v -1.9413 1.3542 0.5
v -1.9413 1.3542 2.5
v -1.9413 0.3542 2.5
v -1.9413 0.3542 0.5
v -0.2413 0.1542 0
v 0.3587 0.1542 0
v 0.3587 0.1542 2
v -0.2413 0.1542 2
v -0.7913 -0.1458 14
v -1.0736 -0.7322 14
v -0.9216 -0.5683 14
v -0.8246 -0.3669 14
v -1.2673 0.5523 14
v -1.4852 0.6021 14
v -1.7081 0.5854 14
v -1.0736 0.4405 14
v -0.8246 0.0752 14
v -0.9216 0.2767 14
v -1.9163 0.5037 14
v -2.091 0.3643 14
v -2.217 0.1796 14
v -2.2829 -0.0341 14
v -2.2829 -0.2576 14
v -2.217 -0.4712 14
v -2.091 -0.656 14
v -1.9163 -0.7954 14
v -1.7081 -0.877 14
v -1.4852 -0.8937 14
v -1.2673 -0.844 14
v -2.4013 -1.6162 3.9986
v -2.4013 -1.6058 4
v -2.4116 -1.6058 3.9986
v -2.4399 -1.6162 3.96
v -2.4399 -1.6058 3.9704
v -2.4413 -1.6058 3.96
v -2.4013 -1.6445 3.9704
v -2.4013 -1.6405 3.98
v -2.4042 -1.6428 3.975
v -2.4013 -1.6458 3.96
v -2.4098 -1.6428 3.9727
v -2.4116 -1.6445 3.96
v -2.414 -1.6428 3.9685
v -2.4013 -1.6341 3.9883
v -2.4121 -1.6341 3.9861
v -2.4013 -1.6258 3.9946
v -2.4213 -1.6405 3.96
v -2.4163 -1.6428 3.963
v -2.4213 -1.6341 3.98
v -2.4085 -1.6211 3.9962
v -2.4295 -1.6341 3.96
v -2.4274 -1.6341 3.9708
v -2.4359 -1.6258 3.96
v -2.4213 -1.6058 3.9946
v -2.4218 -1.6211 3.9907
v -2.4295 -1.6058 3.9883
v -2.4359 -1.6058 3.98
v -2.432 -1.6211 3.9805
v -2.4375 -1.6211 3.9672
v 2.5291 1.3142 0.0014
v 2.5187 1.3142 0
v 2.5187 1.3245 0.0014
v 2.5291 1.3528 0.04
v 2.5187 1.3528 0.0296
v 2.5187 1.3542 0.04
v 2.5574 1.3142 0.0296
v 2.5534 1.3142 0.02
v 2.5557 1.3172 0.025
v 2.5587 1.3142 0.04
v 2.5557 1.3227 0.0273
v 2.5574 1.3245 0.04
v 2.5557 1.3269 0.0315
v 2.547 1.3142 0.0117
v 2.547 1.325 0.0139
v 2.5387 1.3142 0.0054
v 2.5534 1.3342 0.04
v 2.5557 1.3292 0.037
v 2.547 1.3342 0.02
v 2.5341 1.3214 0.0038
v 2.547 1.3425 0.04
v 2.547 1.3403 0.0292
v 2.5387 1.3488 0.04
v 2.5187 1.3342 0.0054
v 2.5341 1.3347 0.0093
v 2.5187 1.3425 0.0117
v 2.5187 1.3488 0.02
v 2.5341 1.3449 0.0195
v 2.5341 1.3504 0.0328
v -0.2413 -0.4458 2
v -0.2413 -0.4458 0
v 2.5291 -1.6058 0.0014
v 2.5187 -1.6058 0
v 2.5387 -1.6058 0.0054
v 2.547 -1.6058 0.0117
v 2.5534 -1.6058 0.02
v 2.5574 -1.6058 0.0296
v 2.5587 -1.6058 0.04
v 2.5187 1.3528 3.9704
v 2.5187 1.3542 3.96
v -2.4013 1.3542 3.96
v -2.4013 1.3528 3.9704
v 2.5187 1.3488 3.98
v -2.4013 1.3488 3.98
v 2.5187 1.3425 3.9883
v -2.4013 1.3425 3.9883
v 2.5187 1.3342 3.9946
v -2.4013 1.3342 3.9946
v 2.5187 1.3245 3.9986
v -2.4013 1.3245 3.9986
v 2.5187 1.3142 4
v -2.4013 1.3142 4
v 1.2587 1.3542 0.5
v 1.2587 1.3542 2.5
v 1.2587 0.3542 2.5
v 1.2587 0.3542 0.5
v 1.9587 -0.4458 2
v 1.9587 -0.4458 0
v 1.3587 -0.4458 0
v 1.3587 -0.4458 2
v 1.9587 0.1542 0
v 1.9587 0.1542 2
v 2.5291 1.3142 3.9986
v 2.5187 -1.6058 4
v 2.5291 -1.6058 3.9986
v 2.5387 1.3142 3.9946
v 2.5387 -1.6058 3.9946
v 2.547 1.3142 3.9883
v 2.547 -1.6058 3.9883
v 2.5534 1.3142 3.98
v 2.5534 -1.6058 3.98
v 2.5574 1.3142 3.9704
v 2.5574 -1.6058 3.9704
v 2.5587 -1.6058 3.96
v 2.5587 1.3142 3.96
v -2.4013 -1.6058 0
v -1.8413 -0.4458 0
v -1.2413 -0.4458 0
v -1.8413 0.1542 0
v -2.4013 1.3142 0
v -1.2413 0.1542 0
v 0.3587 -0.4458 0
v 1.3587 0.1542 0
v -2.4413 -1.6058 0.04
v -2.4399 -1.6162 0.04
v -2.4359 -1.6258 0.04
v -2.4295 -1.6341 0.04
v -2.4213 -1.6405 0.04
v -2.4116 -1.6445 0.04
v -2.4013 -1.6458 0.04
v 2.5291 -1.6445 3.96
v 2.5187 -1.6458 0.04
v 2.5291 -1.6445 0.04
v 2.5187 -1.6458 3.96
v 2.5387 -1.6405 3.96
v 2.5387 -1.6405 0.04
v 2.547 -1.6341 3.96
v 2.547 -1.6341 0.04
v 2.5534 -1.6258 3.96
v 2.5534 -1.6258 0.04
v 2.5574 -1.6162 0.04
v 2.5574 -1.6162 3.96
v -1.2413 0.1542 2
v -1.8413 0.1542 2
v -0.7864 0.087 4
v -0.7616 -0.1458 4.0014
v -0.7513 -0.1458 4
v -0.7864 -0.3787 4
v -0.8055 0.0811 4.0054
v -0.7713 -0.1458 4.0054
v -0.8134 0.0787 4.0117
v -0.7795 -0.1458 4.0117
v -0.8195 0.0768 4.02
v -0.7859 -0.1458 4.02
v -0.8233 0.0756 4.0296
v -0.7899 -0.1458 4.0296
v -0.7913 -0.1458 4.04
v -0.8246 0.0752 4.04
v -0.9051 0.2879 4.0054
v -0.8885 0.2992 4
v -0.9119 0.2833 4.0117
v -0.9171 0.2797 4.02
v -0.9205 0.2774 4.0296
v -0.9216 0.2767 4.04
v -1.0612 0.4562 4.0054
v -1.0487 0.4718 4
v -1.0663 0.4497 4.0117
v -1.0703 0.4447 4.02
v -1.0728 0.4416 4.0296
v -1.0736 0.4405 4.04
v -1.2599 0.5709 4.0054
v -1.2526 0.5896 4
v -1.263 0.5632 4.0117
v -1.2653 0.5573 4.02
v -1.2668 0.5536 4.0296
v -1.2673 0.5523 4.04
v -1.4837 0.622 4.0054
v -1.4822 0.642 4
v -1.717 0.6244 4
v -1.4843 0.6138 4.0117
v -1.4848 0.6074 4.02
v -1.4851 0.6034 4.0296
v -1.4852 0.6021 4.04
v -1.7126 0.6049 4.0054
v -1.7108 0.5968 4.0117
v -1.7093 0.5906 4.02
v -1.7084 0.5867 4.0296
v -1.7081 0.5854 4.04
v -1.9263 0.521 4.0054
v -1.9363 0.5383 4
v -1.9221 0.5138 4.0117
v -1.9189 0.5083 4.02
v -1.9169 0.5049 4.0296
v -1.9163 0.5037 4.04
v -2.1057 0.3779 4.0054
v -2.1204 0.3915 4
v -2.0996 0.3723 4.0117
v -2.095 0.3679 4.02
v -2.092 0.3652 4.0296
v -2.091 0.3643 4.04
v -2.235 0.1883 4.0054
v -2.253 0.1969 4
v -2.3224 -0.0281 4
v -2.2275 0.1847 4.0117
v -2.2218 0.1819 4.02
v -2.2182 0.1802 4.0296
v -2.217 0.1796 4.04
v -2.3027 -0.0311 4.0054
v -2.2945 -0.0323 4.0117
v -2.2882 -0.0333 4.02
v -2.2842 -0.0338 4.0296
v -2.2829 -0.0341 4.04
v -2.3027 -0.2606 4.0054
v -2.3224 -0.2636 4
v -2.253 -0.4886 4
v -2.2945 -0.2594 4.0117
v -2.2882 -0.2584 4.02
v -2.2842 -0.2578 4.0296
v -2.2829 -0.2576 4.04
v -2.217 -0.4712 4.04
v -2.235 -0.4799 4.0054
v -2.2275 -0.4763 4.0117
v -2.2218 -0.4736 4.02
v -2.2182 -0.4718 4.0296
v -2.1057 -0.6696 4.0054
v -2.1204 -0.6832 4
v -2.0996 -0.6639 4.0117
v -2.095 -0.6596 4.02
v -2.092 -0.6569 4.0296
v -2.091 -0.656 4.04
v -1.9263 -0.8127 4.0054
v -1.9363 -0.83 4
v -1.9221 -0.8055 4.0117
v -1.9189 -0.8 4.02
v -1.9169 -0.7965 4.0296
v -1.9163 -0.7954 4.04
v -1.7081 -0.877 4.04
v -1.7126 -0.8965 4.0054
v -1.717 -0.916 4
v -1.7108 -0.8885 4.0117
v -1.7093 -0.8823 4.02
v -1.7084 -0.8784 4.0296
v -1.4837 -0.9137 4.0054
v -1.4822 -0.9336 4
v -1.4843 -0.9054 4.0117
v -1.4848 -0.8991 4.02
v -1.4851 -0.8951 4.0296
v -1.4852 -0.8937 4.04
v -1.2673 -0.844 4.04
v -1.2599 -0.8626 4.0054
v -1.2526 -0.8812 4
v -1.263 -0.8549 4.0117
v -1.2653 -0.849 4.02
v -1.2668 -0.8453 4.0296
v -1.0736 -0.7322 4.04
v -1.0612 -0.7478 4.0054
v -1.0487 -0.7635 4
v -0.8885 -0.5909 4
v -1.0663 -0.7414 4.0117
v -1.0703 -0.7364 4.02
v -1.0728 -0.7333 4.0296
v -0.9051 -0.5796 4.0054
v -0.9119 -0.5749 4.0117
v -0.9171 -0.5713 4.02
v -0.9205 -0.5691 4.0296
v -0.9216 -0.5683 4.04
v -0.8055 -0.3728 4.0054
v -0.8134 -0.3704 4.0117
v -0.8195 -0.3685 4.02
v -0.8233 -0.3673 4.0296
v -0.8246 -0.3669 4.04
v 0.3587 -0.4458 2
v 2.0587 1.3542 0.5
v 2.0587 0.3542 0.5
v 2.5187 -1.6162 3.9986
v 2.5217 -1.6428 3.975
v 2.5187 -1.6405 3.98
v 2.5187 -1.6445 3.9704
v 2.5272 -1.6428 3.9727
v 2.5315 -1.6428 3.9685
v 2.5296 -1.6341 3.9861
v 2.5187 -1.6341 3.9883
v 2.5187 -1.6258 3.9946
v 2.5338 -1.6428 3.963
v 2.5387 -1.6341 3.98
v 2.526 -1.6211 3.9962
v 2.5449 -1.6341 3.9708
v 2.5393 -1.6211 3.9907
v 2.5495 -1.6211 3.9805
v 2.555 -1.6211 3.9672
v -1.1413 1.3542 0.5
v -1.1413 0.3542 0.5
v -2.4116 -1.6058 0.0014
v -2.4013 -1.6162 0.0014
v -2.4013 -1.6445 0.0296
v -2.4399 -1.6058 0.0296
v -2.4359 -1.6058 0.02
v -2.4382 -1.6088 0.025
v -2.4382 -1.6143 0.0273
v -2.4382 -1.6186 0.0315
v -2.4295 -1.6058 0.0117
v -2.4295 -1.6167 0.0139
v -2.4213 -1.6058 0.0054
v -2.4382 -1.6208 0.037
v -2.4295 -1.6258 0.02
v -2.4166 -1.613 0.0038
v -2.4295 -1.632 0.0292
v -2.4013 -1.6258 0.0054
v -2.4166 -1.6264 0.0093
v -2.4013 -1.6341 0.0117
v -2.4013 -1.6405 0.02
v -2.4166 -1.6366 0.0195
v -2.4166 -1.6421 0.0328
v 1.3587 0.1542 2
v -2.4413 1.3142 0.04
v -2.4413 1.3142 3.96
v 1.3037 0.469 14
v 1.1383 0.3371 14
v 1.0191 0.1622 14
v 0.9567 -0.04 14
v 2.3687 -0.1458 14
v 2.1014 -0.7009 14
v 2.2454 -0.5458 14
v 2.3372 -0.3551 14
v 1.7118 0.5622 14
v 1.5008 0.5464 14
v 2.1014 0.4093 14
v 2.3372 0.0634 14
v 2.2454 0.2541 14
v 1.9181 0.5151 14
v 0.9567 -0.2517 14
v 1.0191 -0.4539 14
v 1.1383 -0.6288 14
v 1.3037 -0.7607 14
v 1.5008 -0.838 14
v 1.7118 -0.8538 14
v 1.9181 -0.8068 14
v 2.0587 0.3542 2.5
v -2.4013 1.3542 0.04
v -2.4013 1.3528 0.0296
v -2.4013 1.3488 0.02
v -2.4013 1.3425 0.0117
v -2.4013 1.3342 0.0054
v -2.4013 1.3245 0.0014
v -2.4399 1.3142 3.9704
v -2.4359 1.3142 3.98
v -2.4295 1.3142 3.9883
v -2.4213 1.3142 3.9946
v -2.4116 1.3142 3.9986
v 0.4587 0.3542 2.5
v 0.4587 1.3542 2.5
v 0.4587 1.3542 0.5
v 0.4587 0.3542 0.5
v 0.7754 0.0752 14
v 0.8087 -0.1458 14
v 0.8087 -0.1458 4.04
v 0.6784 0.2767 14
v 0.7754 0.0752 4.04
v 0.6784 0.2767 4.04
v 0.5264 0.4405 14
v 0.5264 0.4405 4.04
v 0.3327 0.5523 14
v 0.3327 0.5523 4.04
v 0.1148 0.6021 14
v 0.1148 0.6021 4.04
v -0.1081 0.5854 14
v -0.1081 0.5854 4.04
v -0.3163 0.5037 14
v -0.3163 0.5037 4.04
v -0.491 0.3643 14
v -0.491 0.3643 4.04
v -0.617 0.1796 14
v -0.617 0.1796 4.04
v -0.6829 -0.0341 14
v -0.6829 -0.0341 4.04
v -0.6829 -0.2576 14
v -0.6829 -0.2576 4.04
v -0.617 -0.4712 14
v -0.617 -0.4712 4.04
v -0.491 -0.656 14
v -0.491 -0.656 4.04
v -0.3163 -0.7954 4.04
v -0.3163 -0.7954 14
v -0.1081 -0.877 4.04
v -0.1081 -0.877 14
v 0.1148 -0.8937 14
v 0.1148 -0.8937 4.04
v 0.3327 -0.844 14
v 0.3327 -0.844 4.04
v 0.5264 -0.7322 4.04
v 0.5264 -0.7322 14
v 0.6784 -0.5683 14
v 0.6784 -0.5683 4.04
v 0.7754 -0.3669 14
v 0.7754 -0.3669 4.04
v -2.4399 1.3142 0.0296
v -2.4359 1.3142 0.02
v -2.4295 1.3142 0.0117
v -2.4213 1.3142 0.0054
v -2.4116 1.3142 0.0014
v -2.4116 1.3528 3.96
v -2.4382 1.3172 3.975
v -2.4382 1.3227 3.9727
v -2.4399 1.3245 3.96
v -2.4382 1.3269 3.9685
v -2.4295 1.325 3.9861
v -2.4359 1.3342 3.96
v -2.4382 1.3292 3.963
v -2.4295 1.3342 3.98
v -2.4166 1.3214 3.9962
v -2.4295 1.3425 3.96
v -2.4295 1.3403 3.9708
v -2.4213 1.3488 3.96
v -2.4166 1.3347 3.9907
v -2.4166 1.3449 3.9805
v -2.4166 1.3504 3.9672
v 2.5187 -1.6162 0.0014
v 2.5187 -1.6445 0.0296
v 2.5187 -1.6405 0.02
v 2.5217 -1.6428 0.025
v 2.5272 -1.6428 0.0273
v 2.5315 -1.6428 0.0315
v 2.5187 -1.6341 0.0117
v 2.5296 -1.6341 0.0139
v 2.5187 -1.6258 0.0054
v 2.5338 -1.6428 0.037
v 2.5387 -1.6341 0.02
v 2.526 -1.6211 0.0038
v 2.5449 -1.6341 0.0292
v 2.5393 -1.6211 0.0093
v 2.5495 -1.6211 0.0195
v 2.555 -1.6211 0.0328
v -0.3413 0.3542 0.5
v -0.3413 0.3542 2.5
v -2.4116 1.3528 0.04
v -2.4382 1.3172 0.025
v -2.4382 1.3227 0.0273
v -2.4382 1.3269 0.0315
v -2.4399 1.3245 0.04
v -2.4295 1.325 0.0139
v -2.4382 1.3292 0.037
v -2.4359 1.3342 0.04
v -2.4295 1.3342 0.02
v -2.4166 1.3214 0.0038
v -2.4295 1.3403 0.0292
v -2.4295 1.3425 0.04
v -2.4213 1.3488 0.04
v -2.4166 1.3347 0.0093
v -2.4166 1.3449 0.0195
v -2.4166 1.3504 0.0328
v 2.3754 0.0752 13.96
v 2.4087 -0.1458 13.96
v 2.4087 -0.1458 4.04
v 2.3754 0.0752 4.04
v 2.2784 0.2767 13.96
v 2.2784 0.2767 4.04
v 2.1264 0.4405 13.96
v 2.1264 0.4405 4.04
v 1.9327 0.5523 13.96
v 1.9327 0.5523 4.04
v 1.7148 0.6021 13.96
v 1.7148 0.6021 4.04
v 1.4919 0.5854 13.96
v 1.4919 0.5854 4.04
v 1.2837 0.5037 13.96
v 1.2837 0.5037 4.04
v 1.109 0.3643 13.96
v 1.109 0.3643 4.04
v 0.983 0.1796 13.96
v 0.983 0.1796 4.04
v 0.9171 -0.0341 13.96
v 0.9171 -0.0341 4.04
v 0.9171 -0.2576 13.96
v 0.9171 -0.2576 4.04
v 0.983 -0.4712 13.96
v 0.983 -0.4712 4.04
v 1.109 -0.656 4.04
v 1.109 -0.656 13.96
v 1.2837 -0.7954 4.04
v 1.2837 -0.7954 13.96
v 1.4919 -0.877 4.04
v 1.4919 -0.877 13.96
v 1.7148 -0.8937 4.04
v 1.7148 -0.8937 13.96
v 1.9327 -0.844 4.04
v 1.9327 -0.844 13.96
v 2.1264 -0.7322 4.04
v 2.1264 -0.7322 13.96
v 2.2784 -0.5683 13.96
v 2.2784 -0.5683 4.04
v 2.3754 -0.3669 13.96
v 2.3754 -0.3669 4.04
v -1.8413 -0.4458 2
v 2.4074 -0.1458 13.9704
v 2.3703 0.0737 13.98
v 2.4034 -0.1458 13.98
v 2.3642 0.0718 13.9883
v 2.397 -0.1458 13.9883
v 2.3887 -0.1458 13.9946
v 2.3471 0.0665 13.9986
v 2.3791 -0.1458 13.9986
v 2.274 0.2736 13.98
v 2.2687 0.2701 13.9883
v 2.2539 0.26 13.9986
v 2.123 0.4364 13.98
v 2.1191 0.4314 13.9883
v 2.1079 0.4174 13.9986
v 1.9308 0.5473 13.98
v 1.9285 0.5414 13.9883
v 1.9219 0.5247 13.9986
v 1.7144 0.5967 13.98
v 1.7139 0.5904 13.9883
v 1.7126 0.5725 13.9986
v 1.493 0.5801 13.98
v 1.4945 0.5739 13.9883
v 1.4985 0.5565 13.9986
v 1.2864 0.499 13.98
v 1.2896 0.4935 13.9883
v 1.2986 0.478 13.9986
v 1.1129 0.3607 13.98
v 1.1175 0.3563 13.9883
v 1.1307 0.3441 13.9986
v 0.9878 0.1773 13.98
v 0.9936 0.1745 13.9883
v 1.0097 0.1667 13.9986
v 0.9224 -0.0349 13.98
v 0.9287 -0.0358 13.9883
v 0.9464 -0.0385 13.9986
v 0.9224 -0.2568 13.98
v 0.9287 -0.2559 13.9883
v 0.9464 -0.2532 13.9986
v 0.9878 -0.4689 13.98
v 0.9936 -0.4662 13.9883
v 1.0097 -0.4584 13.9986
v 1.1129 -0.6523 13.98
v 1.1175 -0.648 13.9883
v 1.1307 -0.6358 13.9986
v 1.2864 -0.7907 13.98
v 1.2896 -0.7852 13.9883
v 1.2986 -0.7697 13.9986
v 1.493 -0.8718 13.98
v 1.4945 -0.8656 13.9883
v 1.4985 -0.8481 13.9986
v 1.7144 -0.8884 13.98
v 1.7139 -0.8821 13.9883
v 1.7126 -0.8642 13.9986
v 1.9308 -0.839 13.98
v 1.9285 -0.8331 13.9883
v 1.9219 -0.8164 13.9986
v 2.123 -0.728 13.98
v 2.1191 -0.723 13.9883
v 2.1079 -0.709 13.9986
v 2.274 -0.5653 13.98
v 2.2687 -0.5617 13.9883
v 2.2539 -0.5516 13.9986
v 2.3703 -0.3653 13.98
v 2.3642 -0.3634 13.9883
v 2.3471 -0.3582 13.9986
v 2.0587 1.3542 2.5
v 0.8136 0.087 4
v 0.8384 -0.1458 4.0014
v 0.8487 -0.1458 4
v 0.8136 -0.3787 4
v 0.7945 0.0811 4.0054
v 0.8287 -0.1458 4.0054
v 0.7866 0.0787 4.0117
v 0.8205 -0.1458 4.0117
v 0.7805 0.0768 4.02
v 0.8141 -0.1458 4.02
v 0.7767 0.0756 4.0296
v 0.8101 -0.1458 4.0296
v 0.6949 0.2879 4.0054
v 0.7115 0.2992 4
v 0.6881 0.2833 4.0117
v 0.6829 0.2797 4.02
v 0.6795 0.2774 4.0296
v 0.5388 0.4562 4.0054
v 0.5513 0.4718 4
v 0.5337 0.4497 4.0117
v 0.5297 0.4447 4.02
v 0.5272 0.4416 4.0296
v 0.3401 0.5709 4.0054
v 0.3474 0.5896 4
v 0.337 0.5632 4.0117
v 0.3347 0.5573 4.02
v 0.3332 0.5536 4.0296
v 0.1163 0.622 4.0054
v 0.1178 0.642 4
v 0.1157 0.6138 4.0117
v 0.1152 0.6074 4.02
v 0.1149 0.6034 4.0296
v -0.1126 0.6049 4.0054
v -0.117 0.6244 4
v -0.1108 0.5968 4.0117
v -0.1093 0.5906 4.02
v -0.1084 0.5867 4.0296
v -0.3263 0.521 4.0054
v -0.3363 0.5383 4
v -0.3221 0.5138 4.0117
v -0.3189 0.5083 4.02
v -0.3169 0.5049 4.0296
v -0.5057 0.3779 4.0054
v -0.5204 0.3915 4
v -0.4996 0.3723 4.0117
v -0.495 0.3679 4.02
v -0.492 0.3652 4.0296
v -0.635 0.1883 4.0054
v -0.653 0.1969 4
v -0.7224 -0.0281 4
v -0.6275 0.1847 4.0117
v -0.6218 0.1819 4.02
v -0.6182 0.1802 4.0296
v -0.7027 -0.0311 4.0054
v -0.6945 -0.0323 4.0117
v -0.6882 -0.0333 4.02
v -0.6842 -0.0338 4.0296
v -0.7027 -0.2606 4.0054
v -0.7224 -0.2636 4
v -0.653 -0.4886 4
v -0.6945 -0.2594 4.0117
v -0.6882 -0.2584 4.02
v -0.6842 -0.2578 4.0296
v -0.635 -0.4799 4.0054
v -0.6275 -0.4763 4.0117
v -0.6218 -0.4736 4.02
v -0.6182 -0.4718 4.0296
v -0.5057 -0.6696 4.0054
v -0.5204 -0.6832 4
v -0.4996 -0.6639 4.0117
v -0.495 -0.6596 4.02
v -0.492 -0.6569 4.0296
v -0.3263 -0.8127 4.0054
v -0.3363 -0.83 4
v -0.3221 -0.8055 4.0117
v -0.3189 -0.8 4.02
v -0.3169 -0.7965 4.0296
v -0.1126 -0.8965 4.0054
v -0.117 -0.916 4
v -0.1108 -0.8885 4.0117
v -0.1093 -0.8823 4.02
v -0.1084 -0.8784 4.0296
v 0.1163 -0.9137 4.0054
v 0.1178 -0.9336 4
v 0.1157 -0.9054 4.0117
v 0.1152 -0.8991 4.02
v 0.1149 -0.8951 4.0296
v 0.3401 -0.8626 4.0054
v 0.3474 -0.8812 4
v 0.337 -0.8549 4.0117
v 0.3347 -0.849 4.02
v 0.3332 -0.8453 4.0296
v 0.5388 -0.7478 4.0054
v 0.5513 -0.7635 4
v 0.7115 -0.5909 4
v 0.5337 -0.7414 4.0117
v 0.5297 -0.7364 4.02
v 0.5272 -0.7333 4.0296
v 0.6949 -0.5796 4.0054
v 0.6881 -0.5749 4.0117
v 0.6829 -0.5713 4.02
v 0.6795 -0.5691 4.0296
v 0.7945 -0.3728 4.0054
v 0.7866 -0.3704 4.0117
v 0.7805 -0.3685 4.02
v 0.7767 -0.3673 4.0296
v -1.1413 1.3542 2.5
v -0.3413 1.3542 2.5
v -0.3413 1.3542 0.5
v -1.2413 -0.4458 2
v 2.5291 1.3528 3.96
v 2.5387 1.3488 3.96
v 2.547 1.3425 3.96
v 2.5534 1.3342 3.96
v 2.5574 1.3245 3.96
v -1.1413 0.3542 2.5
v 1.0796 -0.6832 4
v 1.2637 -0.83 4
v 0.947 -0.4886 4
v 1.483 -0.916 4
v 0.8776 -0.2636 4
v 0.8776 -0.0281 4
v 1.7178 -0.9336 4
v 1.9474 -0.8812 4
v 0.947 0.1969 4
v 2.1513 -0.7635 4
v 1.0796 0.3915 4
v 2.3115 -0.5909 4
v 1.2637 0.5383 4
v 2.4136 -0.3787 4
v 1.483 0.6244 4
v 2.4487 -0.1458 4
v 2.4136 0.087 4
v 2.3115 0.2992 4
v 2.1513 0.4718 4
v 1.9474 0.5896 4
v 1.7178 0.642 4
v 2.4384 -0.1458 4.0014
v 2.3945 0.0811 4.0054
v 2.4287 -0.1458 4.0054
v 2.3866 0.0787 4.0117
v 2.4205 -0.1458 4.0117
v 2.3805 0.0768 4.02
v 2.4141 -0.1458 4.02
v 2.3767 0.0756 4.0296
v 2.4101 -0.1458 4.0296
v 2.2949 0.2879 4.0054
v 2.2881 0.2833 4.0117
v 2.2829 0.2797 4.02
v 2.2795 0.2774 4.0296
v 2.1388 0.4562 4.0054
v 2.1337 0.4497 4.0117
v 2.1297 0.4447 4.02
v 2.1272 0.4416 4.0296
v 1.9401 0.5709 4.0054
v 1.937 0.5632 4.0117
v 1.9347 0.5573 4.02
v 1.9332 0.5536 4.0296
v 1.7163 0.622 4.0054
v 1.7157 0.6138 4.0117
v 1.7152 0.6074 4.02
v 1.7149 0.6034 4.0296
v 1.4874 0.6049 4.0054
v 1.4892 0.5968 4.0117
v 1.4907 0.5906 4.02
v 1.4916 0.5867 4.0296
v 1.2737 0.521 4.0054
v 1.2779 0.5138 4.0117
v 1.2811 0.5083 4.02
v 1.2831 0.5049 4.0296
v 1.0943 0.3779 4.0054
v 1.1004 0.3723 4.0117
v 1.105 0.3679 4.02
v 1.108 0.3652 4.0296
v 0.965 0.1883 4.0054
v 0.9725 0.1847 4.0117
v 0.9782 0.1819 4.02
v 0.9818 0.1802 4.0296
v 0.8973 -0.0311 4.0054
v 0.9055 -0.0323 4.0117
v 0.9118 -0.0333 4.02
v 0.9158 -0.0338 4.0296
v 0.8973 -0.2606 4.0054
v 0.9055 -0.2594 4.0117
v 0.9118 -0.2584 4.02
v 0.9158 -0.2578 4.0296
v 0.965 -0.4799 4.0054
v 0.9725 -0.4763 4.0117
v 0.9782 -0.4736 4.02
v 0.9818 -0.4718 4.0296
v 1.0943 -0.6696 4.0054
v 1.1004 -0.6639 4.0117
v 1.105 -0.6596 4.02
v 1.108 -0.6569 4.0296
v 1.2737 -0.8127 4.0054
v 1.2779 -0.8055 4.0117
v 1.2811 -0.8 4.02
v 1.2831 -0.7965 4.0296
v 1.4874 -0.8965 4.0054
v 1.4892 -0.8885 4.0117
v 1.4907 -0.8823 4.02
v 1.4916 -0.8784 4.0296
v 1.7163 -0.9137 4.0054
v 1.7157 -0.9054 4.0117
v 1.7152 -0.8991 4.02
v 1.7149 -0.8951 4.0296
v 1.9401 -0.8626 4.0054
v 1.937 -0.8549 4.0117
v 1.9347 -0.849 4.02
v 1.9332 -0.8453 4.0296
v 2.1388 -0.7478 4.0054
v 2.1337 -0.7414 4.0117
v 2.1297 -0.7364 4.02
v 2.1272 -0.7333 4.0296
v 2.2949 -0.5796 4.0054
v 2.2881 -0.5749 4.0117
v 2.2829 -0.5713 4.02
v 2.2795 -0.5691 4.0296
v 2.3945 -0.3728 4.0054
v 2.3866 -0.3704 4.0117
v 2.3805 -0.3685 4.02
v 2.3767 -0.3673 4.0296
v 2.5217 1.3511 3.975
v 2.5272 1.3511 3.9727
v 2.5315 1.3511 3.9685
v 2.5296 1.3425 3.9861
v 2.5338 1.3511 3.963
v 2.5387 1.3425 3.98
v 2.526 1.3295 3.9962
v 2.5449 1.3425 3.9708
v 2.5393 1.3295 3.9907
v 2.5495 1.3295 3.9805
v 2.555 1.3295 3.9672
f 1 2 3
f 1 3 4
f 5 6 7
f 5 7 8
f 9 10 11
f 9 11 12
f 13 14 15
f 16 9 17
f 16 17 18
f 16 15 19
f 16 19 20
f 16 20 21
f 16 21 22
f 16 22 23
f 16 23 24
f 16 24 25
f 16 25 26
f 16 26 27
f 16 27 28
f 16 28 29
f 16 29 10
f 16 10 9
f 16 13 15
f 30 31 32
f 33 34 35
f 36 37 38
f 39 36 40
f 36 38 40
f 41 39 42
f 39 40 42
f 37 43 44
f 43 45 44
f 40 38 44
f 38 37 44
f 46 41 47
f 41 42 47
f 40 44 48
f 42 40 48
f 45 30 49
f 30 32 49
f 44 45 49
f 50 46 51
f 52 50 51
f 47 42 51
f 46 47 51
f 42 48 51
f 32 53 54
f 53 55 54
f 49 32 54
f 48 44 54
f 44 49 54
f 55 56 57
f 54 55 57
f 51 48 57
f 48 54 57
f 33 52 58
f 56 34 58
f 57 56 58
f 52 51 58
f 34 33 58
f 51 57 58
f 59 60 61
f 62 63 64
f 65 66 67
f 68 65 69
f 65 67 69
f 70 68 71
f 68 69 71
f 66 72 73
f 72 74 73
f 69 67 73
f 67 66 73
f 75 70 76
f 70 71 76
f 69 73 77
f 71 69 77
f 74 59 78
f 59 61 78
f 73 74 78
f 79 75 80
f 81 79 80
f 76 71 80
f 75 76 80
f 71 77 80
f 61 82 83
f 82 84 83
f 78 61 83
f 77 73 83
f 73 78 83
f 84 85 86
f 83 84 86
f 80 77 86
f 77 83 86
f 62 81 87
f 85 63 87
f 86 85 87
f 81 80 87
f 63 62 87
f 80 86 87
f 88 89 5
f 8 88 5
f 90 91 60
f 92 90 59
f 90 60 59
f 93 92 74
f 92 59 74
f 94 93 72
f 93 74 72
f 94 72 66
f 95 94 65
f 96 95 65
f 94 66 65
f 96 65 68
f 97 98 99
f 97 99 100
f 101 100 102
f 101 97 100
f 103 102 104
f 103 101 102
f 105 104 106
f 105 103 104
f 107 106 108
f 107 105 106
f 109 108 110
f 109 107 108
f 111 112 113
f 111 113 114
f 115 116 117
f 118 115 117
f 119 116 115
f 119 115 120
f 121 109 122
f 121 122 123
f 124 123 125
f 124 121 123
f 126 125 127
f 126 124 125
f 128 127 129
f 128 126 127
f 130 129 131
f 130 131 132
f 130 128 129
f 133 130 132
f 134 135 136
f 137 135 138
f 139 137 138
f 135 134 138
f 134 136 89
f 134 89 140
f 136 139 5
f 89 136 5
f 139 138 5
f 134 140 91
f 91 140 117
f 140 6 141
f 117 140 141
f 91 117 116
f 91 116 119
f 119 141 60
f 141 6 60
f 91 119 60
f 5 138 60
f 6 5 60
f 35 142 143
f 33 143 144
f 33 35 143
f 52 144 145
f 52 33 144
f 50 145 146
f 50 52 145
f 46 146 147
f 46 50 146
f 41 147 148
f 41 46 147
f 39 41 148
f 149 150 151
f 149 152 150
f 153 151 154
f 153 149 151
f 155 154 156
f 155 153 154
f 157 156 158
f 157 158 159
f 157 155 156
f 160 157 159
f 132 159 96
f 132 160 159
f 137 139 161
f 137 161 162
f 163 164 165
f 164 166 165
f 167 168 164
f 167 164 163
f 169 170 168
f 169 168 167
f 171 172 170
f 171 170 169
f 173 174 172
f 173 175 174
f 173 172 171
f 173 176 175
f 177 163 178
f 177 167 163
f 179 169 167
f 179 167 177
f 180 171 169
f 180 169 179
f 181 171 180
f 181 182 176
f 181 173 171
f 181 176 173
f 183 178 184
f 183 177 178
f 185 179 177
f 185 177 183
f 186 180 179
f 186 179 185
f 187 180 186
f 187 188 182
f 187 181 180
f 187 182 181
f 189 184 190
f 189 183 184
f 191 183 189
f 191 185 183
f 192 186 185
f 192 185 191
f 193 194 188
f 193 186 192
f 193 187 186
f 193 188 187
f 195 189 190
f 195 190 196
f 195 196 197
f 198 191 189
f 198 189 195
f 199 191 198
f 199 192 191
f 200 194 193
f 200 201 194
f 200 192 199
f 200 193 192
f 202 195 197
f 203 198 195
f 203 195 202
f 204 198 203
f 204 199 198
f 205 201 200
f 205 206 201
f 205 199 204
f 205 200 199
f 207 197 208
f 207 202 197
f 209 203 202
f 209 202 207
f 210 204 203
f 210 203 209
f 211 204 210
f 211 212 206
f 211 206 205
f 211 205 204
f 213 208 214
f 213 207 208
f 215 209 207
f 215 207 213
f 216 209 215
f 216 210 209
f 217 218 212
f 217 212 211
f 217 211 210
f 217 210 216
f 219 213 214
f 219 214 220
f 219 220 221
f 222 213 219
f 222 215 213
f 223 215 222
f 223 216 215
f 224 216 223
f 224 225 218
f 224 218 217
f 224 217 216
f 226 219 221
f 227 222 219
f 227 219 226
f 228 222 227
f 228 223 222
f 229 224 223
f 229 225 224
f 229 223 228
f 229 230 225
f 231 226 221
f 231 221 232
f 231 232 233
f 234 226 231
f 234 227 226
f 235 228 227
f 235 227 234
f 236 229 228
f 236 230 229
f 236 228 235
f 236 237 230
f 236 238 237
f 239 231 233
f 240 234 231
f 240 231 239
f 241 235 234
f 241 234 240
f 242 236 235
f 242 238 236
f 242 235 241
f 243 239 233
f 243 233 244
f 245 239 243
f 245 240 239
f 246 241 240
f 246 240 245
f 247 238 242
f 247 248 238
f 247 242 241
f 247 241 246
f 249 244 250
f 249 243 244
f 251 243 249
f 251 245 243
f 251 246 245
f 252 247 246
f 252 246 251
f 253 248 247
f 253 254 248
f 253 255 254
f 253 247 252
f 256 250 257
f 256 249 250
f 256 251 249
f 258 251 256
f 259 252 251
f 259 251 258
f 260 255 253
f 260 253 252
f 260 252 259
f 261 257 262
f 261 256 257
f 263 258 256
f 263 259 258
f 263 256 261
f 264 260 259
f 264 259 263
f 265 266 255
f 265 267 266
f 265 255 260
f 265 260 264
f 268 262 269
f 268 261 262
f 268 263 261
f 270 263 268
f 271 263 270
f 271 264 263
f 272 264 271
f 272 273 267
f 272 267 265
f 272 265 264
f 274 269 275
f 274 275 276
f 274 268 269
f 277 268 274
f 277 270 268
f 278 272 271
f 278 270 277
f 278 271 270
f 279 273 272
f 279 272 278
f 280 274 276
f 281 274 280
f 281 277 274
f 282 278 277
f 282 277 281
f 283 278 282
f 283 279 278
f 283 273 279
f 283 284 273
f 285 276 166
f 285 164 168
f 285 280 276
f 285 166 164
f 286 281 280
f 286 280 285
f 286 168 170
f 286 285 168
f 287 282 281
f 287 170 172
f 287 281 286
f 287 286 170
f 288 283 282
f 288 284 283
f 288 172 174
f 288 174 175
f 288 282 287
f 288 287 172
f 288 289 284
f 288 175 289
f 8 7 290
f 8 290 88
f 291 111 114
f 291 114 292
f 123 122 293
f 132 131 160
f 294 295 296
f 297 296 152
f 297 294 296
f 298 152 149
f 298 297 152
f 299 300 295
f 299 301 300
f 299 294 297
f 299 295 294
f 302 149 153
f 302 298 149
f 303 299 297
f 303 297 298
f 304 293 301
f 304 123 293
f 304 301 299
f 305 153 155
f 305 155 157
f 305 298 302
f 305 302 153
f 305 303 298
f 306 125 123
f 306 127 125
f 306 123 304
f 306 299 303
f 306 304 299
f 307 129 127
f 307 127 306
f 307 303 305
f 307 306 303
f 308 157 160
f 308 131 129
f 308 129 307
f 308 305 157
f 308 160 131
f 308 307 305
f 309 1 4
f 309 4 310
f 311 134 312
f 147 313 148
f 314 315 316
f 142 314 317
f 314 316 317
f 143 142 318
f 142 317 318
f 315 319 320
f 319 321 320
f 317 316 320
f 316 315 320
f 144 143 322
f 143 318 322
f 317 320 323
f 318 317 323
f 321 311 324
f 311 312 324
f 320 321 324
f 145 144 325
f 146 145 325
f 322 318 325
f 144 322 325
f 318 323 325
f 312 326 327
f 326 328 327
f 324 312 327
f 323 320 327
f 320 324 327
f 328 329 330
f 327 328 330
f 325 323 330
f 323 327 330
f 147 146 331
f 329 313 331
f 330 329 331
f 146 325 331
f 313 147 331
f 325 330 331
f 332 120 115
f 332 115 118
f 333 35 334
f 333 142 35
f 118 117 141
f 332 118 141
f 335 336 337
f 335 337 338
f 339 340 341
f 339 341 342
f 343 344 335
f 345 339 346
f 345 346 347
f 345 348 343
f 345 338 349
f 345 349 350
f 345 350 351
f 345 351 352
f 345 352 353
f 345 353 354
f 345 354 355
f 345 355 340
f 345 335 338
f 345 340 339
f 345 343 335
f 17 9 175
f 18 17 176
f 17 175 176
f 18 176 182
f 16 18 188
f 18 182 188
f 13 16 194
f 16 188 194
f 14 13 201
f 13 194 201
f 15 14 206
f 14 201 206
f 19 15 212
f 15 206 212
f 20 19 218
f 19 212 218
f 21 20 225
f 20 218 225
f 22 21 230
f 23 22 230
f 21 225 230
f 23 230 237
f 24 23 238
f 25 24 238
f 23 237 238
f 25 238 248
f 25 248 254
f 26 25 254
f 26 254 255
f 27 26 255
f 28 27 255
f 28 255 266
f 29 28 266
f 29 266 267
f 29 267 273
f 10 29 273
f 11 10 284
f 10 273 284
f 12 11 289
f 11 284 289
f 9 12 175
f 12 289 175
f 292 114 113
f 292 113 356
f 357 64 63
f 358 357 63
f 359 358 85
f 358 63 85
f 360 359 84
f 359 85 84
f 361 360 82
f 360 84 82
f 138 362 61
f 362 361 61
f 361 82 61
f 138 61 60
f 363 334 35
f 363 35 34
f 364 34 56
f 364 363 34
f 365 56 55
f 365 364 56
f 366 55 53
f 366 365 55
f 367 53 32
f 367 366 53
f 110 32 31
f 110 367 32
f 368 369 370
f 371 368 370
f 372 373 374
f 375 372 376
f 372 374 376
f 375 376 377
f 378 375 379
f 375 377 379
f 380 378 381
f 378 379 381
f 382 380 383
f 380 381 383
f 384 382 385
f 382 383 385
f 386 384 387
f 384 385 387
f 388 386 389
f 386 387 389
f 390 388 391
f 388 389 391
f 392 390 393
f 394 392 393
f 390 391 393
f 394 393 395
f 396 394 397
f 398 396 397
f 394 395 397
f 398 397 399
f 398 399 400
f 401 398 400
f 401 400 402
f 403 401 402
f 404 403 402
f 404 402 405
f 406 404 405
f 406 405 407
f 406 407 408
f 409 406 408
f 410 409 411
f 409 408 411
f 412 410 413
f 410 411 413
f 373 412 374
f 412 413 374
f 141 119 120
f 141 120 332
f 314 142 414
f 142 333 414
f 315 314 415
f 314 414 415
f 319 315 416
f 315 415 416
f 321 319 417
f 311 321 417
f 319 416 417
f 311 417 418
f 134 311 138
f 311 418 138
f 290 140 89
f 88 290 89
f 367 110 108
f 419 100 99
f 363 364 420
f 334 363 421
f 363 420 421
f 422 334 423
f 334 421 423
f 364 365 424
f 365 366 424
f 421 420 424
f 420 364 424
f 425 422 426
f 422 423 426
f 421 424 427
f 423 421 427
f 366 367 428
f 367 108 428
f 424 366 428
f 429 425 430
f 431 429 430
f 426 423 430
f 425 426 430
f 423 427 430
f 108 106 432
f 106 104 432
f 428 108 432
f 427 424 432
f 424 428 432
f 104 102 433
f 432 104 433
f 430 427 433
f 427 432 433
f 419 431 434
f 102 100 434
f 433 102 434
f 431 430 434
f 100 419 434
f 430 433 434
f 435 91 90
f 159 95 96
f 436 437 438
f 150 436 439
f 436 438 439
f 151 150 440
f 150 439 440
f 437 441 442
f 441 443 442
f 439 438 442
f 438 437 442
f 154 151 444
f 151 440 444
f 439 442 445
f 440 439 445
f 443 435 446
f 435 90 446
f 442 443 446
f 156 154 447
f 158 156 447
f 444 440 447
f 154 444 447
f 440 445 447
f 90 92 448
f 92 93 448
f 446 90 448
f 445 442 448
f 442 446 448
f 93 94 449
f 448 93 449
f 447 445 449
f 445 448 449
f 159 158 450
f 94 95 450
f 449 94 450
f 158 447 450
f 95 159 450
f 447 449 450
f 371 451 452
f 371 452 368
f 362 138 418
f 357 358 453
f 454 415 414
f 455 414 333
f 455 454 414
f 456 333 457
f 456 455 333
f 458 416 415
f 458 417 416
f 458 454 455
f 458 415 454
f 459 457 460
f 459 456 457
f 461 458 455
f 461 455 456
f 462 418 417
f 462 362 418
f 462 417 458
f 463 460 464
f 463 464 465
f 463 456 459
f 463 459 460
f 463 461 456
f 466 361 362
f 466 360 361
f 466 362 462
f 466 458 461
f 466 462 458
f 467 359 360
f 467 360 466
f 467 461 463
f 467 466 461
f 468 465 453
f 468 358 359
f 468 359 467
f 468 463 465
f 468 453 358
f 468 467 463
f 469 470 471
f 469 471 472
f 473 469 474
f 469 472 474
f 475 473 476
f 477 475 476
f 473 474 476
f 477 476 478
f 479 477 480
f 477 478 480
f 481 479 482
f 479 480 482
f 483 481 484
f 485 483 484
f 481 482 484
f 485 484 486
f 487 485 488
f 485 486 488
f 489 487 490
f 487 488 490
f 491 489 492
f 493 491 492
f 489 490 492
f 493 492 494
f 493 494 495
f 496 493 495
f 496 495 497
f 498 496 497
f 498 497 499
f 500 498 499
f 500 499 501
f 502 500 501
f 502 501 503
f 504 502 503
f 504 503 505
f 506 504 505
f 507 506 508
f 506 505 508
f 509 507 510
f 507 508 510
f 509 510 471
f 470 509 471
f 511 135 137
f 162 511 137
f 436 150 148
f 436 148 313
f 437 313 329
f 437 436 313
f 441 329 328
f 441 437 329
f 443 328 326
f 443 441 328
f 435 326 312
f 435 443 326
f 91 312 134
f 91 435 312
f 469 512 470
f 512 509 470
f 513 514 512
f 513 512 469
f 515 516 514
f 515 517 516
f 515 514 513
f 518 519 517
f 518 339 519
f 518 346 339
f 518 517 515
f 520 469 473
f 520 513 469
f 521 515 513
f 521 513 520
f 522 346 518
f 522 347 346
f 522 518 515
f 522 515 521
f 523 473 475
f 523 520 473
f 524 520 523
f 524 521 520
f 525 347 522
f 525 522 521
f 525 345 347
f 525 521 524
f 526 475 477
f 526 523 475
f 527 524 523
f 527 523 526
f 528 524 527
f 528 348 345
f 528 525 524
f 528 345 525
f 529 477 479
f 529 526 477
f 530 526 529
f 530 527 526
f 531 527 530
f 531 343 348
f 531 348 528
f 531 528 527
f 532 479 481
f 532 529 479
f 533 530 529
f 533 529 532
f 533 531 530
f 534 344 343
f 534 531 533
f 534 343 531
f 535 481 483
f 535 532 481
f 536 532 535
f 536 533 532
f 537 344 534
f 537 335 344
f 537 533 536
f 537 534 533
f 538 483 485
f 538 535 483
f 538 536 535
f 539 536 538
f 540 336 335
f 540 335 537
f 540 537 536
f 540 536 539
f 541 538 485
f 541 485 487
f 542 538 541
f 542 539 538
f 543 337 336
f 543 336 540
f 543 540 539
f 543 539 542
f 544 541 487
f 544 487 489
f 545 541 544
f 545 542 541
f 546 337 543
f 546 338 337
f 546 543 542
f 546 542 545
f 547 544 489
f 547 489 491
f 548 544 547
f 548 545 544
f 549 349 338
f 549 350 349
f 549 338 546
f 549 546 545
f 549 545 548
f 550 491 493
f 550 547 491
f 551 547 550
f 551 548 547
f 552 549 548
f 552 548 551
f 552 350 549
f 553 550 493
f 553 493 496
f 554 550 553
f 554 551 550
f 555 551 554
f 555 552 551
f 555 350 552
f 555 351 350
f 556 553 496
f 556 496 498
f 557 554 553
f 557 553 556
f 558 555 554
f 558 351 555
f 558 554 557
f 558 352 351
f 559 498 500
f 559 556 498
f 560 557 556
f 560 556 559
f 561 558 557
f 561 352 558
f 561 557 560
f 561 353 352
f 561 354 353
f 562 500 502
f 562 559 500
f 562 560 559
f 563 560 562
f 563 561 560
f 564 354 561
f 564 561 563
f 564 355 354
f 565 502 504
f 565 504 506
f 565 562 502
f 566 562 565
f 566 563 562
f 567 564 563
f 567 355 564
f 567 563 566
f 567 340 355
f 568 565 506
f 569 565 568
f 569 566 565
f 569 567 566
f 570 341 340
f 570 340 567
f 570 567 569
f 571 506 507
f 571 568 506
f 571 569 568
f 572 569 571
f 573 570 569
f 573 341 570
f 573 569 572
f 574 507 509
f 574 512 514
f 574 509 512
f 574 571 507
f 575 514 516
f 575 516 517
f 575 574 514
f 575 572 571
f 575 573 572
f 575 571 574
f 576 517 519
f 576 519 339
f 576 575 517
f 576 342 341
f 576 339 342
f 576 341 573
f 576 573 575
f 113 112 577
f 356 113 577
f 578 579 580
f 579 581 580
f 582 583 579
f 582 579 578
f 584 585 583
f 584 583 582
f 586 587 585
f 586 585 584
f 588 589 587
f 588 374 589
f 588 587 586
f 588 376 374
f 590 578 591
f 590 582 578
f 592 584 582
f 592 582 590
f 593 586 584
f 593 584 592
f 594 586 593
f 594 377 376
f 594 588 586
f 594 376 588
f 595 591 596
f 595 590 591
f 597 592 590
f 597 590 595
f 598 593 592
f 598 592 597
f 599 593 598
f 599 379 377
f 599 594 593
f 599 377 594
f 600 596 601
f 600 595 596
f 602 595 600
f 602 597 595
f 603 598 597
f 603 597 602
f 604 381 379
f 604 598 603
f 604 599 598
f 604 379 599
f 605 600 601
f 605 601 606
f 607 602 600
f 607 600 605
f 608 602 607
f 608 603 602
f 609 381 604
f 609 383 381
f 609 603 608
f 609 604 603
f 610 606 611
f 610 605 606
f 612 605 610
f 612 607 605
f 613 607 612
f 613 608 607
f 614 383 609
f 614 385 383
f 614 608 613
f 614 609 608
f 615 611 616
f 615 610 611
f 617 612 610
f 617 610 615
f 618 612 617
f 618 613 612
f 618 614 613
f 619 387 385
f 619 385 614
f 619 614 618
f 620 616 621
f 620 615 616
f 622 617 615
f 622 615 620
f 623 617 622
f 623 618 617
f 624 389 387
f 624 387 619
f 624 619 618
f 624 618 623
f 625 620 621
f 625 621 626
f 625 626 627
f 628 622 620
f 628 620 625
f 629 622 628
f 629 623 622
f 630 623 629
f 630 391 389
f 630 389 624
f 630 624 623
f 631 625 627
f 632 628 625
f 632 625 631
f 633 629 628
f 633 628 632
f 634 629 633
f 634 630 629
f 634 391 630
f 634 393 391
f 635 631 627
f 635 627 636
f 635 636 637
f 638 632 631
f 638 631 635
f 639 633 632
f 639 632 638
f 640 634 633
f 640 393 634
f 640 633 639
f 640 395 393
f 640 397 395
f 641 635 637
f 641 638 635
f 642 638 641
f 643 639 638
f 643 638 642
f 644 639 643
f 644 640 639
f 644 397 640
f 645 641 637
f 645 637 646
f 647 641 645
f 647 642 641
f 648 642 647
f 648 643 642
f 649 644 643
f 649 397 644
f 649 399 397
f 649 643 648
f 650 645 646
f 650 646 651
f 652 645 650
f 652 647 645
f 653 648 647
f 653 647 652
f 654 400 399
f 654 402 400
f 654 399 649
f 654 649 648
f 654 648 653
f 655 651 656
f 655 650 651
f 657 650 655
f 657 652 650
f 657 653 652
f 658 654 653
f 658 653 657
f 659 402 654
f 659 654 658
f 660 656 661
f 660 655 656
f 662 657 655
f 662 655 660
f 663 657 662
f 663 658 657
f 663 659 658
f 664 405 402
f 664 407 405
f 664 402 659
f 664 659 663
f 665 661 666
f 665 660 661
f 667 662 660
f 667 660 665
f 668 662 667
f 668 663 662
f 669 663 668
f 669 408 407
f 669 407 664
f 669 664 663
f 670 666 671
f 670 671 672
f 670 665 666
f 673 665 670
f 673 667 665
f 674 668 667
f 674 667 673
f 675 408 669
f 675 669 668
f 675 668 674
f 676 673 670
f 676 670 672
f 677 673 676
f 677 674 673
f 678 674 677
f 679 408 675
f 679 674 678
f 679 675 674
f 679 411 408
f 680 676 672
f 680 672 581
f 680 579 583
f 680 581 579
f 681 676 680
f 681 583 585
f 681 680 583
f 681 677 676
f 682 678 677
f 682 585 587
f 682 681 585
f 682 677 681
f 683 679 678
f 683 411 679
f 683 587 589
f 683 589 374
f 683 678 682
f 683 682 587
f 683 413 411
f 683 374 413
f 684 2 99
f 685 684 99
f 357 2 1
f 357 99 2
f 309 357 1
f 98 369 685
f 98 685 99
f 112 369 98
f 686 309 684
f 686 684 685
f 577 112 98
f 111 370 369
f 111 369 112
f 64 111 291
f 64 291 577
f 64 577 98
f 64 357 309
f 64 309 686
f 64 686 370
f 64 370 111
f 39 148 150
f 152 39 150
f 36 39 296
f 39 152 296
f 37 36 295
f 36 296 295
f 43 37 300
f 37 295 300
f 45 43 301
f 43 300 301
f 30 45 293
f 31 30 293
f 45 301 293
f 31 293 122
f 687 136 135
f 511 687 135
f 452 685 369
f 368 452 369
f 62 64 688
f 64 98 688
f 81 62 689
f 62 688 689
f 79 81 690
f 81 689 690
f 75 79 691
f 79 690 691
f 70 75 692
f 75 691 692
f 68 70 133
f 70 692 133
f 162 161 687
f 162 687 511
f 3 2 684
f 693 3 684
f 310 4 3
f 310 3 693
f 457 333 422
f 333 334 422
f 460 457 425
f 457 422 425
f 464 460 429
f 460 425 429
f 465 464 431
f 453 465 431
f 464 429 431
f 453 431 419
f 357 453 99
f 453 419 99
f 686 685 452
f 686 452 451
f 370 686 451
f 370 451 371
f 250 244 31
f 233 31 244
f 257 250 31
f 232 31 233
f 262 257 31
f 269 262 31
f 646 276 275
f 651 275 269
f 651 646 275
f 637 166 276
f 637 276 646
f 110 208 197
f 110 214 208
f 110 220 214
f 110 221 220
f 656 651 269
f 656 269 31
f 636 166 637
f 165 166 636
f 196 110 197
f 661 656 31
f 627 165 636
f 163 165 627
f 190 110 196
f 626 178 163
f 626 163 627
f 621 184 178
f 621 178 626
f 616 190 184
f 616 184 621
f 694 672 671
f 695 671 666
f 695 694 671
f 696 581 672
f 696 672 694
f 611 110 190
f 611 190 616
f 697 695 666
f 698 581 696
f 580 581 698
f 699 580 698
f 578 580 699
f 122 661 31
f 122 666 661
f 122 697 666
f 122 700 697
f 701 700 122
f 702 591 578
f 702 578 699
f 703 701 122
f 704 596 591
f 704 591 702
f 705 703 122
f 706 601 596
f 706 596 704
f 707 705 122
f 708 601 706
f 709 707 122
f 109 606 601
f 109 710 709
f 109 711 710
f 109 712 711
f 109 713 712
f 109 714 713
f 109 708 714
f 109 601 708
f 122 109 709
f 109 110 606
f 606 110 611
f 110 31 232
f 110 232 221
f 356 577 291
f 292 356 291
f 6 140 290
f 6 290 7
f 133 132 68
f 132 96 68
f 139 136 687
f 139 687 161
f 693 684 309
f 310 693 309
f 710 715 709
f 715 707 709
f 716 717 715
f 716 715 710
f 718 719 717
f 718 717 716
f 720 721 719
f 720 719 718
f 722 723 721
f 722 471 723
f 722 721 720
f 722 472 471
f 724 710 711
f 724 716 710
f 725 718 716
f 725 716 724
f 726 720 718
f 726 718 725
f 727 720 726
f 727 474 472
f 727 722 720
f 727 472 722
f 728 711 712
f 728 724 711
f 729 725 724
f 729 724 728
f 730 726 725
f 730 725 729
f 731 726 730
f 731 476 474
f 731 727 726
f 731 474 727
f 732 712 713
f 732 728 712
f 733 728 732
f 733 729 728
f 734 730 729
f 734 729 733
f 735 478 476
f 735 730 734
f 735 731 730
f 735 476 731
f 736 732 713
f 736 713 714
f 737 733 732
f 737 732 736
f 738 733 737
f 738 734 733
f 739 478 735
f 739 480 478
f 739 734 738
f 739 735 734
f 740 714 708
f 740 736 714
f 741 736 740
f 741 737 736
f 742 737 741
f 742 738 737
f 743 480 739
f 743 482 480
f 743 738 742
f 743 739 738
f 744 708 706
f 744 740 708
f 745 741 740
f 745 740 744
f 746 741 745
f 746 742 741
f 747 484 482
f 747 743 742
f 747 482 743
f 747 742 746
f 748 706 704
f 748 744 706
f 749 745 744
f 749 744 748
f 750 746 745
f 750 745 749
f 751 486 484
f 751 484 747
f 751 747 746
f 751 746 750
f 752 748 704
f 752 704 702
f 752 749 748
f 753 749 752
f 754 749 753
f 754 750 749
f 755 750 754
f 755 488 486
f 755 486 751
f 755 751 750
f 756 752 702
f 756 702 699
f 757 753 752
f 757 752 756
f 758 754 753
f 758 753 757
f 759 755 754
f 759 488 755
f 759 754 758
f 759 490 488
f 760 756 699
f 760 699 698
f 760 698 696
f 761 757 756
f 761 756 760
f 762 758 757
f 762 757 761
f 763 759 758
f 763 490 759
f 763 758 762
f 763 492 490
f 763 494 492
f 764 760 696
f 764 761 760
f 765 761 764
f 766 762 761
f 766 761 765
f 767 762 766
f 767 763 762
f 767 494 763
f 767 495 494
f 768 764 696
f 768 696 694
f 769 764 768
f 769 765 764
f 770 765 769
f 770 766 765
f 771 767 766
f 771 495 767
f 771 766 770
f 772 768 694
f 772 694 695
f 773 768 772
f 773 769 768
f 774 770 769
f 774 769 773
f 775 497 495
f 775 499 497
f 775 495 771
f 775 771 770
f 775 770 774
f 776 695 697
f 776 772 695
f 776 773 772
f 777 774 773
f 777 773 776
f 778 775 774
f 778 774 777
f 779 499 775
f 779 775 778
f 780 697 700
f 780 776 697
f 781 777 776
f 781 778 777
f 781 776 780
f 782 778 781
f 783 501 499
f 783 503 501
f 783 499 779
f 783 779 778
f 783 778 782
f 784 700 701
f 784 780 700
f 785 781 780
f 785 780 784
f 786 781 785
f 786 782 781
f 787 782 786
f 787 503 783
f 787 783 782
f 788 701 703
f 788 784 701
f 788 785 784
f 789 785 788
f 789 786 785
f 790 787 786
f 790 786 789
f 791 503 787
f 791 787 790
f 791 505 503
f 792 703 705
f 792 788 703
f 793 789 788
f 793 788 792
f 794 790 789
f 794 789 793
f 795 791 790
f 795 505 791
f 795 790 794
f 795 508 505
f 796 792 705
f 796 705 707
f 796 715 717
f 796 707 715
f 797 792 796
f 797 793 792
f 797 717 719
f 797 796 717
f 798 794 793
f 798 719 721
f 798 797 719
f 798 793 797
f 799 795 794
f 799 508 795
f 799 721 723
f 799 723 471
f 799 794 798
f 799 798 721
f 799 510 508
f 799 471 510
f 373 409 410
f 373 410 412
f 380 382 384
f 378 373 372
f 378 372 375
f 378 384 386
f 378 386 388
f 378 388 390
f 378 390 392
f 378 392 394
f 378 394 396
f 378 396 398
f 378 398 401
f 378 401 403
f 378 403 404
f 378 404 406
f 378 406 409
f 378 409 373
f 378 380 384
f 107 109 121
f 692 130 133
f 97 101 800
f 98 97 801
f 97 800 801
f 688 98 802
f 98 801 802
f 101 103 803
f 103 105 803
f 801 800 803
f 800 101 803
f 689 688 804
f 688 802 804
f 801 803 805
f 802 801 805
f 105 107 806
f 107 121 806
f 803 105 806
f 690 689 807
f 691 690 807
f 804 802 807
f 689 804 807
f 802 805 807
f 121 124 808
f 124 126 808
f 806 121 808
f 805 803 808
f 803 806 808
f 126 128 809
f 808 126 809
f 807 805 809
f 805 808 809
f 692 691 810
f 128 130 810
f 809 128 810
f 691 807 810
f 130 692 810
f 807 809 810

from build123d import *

# Parameters (mm, degrees)
SKETCH_1_W          = 5
SKETCH_1_H          = 3
EXTRUDE_1_DEPTH     = 4
SKETCH_2_R          = 0.75
EXTRUDE_5_DEPTH     = 10
SKETCH_4_W          = 0.8
SKETCH_4_H          = 2
CUT_EXTRUDE_1_DEPTH = 1
SKETCH_5_W          = 0.6
SKETCH_5_H          = 0.6
CUT_EXTRUDE_2_DEPTH = 2
FILLET_1_R          = 0.04


with BuildPart() as part:
    # 草圖1 → 填料-伸長1 (new body)
    with BuildSketch(Plane.XY):
        with Locations((0.05874417, -0.145833333)):
            Rectangle(SKETCH_1_W, SKETCH_1_H)
    extrude(amount=EXTRUDE_1_DEPTH)

    # 草圖2 → 填料-伸長5 (add)
    with BuildSketch(Plane.XY.offset(4)):
        with Locations((-1.54125583, -0.145833333)):
            Circle(SKETCH_2_R)
        with Locations((0.05874417, -0.145833333)):
            Circle(SKETCH_2_R)
        with Locations((1.65874417, -0.145833333)):
            Circle(SKETCH_2_R)
    extrude(amount=EXTRUDE_5_DEPTH)

    # 草圖4 → 除料-伸長1 (cut)
    with BuildSketch(Plane(origin=(0, 1.354166667, 0), x_dir=(1, 0, 0), z_dir=(0, 1, 0))):
        with Locations((1.65874417, -1.5)):
            Rectangle(SKETCH_4_W, SKETCH_4_H)
        with Locations((0.05874417, -1.5)):
            Rectangle(SKETCH_4_W, SKETCH_4_H)
        with Locations((-1.54125583, -1.5)):
            Rectangle(SKETCH_4_W, SKETCH_4_H)
    extrude(amount=-CUT_EXTRUDE_1_DEPTH, mode=Mode.SUBTRACT)

    # 草圖5 → 除料-伸長2 (cut)
    with BuildSketch(Plane(origin=(0, 0, 0), x_dir=(-1, 0, 0), z_dir=(0, 0, -1))):
        with Locations((-1.65874417, -0.145833333)):
            Rectangle(SKETCH_5_W, SKETCH_5_H)
        with Locations((-0.05874417, -0.145833333)):
            Rectangle(SKETCH_5_W, SKETCH_5_H)
        with Locations((1.54125583, -0.145833333)):
            Rectangle(SKETCH_5_W, SKETCH_5_H)
    extrude(amount=-CUT_EXTRUDE_2_DEPTH, mode=Mode.SUBTRACT)

    # 圓角1
    fillet_1_edges = [part.edges().sort_by_distance(p)[0] for p in [
        (2.55874417, -0.145833333, 4),
        (0.05874417, 1.354166667, 4),
        (-2.29125583, -0.145833333, 4),
        (-0.69125583, -0.145833333, 4),
        (0.90874417, -0.145833333, 4),
        (0.90874417, -0.145833333, 14),
        (-2.44125583, -0.145833333, 4),
        (0.05874417, 1.354166667, 0),
        (2.55874417, -0.145833333, 0),
        (0.05874417, -1.645833333, 0),
        (-2.44125583, -0.145833333, 0),
        (0.05874417, -1.645833333, 4),
        (-2.44125583, 1.354166667, 2),
        (2.55874417, 1.354166667, 2),
        (2.55874417, -1.645833333, 2),
        (-2.44125583, -1.645833333, 2),
    ]]
    fillet(fillet_1_edges, radius=FILLET_1_R)


solid = part.part
